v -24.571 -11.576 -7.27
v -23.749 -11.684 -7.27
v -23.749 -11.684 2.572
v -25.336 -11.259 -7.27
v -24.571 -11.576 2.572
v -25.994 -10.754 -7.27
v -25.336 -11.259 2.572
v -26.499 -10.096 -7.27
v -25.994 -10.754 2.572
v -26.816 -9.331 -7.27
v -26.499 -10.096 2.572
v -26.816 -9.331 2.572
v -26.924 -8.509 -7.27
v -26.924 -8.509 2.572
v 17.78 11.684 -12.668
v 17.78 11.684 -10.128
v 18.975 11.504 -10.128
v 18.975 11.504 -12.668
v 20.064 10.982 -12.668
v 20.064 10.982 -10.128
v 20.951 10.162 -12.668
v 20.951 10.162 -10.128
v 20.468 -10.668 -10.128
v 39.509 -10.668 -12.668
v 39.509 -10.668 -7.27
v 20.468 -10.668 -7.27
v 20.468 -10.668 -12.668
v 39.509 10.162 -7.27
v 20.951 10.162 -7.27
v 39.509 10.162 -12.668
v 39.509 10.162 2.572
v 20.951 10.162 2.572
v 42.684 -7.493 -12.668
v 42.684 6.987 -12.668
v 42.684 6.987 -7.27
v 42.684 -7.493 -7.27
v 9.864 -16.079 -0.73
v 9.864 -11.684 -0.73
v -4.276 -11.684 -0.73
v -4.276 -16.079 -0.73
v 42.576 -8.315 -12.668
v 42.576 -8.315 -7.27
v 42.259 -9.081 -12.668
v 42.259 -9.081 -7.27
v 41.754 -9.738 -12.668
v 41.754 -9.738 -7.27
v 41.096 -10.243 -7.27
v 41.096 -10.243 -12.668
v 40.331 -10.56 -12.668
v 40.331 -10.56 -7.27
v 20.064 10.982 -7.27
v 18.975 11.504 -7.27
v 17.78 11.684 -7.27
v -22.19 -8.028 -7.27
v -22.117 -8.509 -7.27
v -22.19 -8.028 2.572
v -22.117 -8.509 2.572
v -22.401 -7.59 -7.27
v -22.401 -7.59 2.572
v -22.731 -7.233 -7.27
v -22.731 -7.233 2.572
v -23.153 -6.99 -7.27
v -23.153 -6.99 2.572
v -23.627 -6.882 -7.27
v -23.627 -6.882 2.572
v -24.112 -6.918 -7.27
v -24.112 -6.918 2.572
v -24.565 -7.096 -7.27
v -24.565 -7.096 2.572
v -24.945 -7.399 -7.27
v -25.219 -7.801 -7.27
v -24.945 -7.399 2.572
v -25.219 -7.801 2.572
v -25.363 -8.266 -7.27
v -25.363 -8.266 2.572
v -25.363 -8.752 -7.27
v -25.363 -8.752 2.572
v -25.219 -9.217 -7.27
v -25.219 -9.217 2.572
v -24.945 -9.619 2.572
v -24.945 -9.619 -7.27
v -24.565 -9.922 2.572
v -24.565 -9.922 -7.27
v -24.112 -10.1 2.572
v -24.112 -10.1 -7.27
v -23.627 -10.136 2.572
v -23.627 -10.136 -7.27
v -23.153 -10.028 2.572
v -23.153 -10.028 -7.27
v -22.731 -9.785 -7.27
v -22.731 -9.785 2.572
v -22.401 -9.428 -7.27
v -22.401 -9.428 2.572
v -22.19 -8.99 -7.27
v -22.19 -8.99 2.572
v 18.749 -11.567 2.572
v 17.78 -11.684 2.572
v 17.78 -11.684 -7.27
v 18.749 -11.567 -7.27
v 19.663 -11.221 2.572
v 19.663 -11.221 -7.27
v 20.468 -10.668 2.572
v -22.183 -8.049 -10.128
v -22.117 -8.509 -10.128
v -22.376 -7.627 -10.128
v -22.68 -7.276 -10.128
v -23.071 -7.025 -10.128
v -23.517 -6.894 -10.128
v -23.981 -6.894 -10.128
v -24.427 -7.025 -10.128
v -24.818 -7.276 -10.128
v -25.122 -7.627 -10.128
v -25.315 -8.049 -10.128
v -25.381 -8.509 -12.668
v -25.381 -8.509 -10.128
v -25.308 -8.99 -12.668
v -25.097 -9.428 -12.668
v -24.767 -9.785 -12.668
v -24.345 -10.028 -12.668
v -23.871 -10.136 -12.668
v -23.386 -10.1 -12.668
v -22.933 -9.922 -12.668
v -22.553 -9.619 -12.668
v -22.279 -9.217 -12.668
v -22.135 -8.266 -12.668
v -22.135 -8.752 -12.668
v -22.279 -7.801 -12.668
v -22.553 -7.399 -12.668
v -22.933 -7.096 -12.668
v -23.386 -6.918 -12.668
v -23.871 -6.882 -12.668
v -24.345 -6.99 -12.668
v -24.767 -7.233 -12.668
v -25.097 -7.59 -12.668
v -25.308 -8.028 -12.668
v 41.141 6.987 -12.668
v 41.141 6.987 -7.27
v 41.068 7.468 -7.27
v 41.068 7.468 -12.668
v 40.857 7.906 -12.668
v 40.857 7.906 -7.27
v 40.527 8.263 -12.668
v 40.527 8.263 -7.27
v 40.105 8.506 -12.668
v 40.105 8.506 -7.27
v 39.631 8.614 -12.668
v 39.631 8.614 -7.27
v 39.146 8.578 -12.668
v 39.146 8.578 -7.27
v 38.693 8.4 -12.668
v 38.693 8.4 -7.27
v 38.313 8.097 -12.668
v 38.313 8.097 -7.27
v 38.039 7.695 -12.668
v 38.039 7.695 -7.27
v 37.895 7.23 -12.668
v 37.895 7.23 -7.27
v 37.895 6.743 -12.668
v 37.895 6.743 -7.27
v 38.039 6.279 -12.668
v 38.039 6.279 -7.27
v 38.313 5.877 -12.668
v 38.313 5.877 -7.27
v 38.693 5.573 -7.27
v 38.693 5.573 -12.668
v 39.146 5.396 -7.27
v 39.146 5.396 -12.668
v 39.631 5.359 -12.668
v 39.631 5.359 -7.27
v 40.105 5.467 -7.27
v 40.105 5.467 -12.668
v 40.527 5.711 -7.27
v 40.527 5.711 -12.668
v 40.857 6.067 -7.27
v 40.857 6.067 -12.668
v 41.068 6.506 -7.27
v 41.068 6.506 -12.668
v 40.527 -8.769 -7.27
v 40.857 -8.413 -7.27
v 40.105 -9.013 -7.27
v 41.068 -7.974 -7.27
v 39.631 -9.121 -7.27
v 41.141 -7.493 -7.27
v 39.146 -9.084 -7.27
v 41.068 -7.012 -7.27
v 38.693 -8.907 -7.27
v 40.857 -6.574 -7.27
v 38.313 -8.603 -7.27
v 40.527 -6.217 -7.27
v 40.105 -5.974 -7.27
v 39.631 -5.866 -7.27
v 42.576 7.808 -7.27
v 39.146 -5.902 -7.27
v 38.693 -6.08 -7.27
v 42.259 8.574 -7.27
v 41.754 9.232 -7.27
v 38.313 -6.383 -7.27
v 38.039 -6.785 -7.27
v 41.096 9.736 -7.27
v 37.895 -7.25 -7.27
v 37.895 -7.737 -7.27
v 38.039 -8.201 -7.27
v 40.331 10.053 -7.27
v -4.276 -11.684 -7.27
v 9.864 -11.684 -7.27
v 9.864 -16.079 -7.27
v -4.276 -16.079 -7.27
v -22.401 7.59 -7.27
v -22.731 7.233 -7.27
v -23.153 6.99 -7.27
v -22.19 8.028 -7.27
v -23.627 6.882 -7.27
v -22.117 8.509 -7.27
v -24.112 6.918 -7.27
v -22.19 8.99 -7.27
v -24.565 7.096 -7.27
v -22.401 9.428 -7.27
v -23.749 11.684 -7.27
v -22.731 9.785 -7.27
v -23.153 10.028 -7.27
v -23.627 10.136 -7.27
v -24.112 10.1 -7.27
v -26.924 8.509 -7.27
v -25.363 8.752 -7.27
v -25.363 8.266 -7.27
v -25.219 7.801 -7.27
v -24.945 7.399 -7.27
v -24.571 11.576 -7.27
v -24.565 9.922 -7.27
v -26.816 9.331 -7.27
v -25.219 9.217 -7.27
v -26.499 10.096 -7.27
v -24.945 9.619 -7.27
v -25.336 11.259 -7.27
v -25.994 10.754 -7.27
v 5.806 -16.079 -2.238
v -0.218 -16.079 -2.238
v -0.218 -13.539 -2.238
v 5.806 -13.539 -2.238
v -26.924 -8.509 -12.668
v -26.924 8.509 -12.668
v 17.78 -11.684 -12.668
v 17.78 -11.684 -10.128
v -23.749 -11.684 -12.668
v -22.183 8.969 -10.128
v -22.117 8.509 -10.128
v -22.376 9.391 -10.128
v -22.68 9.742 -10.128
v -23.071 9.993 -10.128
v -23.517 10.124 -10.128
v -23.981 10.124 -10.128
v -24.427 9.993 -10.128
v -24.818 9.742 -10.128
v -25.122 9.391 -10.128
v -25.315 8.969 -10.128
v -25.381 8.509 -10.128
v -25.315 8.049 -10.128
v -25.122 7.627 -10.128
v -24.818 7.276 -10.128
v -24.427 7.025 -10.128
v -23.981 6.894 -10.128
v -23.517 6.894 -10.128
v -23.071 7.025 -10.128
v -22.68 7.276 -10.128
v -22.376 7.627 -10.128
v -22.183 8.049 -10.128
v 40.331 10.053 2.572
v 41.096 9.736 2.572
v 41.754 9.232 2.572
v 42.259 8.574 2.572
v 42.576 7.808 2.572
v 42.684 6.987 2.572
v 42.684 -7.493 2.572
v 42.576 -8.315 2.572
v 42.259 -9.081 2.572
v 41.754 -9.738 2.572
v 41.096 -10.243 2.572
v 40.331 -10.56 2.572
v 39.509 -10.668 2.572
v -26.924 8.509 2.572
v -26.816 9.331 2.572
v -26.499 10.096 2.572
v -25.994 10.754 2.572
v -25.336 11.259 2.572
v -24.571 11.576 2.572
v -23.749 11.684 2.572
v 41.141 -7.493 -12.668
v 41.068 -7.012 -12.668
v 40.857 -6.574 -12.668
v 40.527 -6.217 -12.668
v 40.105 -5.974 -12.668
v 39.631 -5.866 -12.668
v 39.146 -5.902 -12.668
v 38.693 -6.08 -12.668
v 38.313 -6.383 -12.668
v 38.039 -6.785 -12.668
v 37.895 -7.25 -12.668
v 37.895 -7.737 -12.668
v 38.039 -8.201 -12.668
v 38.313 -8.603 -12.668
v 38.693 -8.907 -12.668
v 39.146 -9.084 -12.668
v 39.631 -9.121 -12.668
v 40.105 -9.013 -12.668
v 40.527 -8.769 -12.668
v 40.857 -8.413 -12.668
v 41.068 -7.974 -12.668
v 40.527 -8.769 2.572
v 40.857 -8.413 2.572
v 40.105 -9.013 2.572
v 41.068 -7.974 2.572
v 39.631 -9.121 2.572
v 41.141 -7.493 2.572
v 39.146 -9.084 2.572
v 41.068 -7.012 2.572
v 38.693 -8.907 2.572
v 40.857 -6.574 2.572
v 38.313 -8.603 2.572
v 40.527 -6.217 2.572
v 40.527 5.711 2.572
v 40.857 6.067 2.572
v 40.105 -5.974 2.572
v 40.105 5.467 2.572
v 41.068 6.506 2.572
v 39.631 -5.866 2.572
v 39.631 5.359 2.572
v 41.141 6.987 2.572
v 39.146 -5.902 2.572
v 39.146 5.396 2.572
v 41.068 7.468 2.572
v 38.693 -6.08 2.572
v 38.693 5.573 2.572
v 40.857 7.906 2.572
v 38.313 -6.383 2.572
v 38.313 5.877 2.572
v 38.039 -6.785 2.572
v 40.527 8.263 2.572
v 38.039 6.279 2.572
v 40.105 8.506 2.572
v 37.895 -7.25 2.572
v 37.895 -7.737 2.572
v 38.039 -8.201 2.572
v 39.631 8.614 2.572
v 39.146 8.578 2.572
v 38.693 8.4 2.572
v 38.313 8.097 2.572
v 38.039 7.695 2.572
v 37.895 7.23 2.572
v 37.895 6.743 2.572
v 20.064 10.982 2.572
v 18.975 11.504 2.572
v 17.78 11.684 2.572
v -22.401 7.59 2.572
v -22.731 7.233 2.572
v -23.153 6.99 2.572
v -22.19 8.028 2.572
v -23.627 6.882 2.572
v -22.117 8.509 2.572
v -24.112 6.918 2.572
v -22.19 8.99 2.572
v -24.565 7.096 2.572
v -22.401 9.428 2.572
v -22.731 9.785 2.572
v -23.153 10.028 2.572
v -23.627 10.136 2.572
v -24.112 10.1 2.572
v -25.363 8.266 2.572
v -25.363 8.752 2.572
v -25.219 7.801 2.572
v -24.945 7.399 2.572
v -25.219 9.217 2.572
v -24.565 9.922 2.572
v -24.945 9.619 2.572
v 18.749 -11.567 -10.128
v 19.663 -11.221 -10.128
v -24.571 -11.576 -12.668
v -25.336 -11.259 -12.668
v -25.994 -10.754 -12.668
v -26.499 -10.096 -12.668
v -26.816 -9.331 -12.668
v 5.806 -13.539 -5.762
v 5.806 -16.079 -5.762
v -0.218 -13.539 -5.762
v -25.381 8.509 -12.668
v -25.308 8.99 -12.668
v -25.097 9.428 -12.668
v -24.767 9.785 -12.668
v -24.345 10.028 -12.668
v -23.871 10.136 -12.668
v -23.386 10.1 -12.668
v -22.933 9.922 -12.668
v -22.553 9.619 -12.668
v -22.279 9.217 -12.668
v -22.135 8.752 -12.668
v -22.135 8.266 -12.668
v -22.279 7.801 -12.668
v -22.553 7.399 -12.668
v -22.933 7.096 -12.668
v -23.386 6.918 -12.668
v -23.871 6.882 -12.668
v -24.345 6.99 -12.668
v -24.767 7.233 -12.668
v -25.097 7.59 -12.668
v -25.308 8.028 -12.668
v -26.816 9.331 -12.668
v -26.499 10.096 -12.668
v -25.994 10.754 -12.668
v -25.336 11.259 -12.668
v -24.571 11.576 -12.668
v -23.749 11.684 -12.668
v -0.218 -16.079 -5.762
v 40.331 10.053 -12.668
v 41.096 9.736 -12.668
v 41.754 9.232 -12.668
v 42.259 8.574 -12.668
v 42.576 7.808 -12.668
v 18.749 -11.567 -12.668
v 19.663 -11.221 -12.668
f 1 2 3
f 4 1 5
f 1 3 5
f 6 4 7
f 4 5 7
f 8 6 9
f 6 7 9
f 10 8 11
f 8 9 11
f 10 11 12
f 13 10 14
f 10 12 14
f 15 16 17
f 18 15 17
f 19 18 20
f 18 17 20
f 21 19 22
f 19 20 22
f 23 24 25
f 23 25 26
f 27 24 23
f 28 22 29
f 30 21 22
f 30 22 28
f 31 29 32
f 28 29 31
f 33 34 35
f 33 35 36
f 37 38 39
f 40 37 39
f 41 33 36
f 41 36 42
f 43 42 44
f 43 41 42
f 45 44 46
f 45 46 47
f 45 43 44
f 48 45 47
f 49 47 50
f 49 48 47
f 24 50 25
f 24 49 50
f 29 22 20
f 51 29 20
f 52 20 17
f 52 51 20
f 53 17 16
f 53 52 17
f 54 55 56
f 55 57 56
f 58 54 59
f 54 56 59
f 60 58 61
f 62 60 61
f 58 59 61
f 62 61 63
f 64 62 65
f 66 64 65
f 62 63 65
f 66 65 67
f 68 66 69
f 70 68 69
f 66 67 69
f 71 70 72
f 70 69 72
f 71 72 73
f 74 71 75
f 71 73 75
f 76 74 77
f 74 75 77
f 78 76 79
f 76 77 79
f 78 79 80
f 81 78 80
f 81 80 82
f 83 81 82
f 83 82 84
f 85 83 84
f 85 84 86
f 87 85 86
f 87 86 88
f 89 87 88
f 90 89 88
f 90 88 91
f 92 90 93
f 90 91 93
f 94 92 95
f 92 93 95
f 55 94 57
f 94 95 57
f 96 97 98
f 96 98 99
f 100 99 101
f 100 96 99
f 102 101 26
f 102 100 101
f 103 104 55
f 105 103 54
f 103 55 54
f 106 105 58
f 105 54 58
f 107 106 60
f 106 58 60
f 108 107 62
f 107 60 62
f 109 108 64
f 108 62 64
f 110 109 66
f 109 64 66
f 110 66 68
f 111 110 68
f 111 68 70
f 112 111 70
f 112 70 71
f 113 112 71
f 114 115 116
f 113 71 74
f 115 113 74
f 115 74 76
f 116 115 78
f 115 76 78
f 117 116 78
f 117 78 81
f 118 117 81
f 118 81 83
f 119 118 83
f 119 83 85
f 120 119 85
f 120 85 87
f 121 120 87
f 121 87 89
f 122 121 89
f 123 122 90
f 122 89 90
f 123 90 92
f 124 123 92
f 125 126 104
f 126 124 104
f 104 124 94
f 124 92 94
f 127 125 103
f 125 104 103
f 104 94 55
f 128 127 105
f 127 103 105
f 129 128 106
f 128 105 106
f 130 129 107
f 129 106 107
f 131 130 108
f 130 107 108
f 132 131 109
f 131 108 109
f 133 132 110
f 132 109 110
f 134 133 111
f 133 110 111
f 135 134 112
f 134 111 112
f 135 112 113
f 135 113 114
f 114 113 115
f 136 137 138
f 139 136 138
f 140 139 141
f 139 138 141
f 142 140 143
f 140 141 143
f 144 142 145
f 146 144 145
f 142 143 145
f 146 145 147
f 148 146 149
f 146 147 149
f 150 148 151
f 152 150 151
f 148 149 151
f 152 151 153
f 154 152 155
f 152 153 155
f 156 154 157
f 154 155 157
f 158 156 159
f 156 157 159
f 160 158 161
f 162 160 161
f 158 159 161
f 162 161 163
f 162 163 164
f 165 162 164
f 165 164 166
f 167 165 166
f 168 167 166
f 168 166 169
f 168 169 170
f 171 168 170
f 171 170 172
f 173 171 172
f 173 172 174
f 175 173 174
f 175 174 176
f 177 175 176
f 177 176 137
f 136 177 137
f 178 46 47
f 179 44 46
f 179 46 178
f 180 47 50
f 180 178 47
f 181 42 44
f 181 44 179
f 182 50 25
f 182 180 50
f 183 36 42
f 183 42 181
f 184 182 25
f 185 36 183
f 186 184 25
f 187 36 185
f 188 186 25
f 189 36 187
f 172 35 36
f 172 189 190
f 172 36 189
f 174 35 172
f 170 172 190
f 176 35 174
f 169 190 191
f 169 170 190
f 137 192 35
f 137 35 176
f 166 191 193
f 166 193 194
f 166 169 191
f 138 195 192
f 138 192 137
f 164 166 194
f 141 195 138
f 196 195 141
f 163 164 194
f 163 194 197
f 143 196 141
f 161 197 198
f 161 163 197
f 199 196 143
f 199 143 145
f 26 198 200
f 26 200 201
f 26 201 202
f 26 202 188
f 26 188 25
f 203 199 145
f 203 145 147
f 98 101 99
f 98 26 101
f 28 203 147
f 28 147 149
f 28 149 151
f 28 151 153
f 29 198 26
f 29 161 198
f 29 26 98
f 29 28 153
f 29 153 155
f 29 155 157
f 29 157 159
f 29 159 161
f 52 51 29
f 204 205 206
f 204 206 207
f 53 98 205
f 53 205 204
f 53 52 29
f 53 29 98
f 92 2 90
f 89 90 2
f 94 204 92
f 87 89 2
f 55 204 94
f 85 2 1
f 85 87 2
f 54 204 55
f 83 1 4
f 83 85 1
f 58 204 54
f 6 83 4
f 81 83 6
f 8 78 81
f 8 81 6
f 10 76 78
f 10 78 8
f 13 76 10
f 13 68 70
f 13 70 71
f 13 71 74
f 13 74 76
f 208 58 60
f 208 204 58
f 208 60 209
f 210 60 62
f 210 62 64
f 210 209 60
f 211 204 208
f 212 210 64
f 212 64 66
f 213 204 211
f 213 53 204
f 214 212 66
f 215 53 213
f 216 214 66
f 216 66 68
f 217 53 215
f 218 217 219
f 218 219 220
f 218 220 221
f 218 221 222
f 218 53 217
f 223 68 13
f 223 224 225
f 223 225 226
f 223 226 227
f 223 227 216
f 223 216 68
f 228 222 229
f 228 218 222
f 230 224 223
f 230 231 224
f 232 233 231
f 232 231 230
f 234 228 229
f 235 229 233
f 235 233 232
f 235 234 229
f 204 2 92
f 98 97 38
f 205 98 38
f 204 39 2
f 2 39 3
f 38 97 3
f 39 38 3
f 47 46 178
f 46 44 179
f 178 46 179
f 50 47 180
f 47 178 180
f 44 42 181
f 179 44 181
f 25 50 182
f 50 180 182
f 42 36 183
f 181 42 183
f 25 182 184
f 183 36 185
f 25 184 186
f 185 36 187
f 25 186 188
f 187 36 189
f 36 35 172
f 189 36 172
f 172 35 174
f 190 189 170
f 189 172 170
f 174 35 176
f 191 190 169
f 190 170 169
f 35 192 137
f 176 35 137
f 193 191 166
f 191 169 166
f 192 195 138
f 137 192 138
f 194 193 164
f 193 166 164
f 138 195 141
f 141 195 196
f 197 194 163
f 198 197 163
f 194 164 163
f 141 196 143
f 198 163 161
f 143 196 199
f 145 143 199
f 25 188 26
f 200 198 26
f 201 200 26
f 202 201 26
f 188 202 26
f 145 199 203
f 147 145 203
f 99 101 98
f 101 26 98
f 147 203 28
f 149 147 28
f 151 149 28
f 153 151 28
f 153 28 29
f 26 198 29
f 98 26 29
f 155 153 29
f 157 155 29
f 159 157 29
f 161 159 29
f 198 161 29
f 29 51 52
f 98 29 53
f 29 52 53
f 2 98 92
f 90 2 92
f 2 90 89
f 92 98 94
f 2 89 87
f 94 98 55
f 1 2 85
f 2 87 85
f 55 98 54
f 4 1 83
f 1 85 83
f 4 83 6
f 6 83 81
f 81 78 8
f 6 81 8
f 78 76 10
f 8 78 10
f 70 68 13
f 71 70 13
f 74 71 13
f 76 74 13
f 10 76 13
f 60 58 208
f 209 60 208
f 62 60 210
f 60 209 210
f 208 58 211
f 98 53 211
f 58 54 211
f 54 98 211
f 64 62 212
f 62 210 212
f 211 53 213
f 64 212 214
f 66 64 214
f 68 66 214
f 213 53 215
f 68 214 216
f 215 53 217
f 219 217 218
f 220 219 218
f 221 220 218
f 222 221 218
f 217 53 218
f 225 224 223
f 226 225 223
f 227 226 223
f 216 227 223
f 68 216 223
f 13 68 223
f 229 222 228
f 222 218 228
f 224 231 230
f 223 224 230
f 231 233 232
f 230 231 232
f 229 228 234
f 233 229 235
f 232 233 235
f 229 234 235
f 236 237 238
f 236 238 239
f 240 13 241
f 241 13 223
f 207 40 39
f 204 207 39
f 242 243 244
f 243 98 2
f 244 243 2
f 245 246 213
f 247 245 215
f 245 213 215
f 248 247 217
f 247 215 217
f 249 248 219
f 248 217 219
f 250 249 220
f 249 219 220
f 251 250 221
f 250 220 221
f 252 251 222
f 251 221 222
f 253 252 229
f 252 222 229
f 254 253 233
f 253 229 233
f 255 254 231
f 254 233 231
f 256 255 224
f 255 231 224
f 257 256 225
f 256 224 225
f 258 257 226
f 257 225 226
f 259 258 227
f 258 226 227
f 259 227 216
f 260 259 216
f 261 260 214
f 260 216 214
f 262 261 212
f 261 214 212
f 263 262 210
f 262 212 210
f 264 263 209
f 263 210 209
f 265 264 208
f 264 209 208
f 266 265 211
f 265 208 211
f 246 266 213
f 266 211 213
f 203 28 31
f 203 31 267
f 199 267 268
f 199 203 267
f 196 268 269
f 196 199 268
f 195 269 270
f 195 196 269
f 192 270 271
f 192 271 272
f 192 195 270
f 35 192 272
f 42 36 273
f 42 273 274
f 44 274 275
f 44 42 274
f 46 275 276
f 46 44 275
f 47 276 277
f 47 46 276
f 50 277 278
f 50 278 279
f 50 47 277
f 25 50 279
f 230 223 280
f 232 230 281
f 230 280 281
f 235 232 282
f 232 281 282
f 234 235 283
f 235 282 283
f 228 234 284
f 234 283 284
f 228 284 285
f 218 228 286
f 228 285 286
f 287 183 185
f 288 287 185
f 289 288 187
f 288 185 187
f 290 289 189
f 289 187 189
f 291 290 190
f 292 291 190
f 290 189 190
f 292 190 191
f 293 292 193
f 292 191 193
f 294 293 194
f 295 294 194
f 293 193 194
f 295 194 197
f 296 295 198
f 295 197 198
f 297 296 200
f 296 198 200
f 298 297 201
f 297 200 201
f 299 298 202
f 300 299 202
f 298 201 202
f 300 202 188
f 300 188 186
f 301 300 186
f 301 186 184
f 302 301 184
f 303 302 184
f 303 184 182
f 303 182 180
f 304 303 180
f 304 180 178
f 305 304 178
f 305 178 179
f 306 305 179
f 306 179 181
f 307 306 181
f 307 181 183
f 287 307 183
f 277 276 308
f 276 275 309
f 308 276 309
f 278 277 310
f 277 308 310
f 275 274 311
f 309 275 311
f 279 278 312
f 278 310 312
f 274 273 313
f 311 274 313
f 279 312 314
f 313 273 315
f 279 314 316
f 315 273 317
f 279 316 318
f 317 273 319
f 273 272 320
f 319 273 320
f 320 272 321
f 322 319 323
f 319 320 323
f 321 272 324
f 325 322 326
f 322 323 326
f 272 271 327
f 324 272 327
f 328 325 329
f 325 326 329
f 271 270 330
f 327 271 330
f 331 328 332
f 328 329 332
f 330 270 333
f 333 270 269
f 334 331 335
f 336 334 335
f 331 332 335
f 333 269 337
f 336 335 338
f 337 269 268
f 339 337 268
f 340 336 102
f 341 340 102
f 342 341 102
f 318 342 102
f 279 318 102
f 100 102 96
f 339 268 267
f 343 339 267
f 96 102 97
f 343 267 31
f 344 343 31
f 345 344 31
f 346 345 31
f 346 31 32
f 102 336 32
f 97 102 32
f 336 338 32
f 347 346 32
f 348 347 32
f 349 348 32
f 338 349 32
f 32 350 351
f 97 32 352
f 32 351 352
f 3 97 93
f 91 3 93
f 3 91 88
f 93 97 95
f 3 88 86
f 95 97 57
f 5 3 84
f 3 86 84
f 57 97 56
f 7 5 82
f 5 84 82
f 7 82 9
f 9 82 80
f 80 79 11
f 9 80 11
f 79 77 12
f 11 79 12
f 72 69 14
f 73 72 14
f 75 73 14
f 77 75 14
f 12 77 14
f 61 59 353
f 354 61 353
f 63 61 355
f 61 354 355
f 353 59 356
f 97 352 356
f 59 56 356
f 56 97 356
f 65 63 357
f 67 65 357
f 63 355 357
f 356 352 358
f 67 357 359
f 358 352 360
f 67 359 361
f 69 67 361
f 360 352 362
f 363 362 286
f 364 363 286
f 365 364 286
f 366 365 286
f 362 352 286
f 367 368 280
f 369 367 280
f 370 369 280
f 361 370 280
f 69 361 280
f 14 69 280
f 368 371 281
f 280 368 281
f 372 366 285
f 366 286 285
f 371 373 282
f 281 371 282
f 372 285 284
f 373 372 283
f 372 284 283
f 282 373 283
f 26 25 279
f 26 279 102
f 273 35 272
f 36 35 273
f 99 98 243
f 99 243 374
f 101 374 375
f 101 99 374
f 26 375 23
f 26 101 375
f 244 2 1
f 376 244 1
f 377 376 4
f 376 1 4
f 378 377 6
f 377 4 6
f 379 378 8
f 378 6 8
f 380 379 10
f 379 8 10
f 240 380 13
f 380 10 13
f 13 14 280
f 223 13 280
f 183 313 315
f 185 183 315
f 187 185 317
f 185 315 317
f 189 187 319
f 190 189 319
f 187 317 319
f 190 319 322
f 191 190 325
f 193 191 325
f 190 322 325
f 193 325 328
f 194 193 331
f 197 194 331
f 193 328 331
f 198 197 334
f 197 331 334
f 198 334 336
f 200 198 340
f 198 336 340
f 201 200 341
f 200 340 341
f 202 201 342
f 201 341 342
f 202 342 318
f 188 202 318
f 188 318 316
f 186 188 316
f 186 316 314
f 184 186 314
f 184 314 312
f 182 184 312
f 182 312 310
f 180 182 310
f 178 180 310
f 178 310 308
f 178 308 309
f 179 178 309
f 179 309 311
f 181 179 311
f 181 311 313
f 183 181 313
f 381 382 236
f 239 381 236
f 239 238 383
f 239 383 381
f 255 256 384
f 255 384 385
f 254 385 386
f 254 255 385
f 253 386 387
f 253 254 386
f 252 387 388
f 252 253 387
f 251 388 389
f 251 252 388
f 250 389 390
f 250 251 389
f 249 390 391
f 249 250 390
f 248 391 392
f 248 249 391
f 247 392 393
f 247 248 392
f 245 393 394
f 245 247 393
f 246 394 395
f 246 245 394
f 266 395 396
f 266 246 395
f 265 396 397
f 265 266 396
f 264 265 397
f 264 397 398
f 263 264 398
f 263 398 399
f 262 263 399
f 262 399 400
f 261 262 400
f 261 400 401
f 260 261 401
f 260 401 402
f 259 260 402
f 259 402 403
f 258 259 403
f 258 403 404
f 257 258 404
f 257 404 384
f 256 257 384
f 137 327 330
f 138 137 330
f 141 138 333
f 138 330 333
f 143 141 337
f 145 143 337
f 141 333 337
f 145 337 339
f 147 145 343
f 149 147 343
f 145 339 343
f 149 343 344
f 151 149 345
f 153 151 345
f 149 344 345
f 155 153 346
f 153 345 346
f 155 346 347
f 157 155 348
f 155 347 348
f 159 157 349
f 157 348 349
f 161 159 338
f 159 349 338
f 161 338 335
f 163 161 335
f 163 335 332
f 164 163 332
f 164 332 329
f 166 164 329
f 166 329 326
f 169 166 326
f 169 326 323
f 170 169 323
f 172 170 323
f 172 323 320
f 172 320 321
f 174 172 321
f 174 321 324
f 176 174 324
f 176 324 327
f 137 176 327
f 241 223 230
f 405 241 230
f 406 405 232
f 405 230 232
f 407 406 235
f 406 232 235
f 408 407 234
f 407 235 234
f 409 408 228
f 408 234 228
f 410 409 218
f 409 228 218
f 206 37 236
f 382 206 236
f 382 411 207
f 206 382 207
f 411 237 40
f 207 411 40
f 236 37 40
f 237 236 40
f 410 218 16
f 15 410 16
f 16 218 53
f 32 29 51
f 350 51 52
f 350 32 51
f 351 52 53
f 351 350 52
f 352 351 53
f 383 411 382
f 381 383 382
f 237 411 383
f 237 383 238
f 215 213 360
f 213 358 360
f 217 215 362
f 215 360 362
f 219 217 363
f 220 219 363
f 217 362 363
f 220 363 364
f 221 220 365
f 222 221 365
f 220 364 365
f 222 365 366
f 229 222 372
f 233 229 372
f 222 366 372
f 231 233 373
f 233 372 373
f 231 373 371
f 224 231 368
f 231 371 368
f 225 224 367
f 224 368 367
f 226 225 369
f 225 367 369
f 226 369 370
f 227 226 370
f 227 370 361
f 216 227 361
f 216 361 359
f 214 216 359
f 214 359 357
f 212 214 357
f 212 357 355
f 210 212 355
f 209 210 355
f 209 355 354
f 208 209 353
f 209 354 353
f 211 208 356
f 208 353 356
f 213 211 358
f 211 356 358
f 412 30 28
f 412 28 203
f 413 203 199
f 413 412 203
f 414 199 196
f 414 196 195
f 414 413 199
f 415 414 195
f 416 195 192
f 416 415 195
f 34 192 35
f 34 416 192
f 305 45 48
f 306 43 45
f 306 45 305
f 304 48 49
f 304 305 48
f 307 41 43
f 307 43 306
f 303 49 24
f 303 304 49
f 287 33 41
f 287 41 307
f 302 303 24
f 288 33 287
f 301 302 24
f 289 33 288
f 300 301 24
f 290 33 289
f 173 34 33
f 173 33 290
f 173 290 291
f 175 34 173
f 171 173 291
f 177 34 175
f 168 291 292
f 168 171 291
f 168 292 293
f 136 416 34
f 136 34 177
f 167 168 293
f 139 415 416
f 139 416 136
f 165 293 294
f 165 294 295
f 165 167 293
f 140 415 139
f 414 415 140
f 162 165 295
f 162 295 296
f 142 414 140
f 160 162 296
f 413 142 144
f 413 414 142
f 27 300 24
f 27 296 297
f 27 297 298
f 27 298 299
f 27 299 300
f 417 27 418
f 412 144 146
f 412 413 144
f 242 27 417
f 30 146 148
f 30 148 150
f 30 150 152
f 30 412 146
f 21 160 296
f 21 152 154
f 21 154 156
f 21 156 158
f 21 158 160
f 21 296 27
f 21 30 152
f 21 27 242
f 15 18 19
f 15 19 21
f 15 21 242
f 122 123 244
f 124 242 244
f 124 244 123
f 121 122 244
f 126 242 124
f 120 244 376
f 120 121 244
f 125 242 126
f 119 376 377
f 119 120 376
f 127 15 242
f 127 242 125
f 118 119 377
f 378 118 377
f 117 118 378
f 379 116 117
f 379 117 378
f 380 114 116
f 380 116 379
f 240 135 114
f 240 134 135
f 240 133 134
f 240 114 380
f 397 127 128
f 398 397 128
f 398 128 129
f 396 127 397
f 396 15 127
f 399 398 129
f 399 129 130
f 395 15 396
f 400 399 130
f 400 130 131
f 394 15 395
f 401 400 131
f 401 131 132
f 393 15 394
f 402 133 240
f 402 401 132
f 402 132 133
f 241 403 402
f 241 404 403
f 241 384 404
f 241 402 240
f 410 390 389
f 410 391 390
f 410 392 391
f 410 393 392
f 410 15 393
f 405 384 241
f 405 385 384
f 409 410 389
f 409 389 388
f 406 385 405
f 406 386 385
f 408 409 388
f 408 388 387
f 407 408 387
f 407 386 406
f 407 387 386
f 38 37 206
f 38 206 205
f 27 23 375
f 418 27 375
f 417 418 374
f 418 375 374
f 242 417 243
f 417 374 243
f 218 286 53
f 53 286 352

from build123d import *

# Parameters (mm, degrees)
BOSS_EXTRUDE1_START             = 0.508
BOSS_EXTRUDE1_DEPTH             = 12.7
BOSS_EXTRUDE2_DEPTH             = 3.27
BOSS_EXTRUDE2_DEPTH_BACK        = 3.27
SKETCH2_W                       = 14.14
SKETCH2_H                       = 7.9502
SKETCH3_W                       = 36.079999008
SKETCH3_H                       = 20.829999962
BOSS_EXTRUDE3_DEPTH             = 2.54
BOSS_EXTRUDE3_DIRECTION_2_REACH = 31.949
SKETCH7_W                       = 6.024
SKETCH7_H                       = 3.524
CUT_EXTRUDE1_DEPTH              = 2.54
BOSS_EXTRUDE5_DEPTH             = 12.7
F_4_CLEARANCE_HOLE4_D           = 3.2639
BOSS_EXTRUDE6_DEPTH             = 15.24
F_4_CLEARANCE_HOLE5_D           = 3.2639
SKETCH17_R                      = 1.63195
BOSS_EXTRUDE8_DEPTH             = 2.54


with BuildPart() as part:
    # Sketch1 → Boss-Extrude1 (new body)
    with BuildSketch(Plane.XY.offset(2.064).offset(BOSS_EXTRUDE1_START)):
        with BuildLine():
            Line((-21.844, 7.62), (-21.844, -7.62))
            ThreePointArc((-21.844, -7.62), (-20.653681959, -10.493681959), (-17.78, -11.684))
            Line((-17.78, -11.684), (17.78, -11.684))
            ThreePointArc((17.78, -11.684), (20.653681959, -10.493681959), (21.844, -7.62))
            Line((21.844, -7.62), (21.844, 7.62))
            ThreePointArc((21.844, 7.62), (20.653681959, 10.493681959), (17.78, 11.684))
            Line((17.78, 11.684), (-17.78, 11.684))
            ThreePointArc((-17.78, 11.684), (-20.653681959, 10.493681959), (-21.844, 7.62))
        make_face()
    extrude(amount=-BOSS_EXTRUDE1_DEPTH)

    # Sketch2 → Boss-Extrude2 (add, two sides: drawn at the far end of the back side and taken through both)
    with BuildSketch(Plane(origin=(0, 0, -4), x_dir=(-1, 0, 0), z_dir=(0, 0, -1)).offset(-BOSS_EXTRUDE2_DEPTH_BACK)):
        with Locations((-2.794, -12.10347265)):
            Rectangle(SKETCH2_W, SKETCH2_H)
    extrude(amount=BOSS_EXTRUDE2_DEPTH + BOSS_EXTRUDE2_DEPTH_BACK)

    # Sketch3 → Boss-Extrude3 (add)
    with BuildSketch(Plane(origin=(0, 0, -10.128), x_dir=(-1, 0, 0), z_dir=(0, 0, -1))):
        with Locations((-19.563999504, -0.253372669)):
            Rectangle(SKETCH3_W, SKETCH3_H)
    extrude(amount=BOSS_EXTRUDE3_DEPTH)

    # Boss-Extrude3 direction 2: up to this face of the body (flat: up to its plane)
    boss_extrude3_direction_2_end = Plane(part.part.faces().sort_by_distance((0, 0, 2.572))[0])
    # Sketch3 → Boss-Extrude3 direction 2 (add, up to the picked face)
    with BuildSketch(Plane(origin=(0, 0, -10.128), x_dir=(-1, 0, 0), z_dir=(0, 0, -1)), mode=Mode.PRIVATE) as boss_extrude3_direction_2_sk1:
        with Locations((-19.563999504, -0.253372669)):
            Rectangle(SKETCH3_W, SKETCH3_H)
    boss_extrude3_direction_2_tool1 = split(extrude(boss_extrude3_direction_2_sk1.sketch, amount=-BOSS_EXTRUDE3_DIRECTION_2_REACH, mode=Mode.PRIVATE), bisect_by=boss_extrude3_direction_2_end, keep=Keep.BOTH, mode=Mode.PRIVATE)
    add(boss_extrude3_direction_2_tool1.solids().sort_by(Axis((19.564, -0.253373, -10.128), (0, 0, 1)))[0])

    # Sketch7 → Cut-Extrude1 (cut)
    with BuildSketch(Plane.XZ.offset(16.07857265)):
        with Locations((2.794, -4)):
            Rectangle(SKETCH7_W, SKETCH7_H)
    extrude(amount=-CUT_EXTRUDE1_DEPTH, mode=Mode.SUBTRACT)

    # Sketch11 → Boss-Extrude5 (add, through all)
    with BuildSketch(Plane(origin=(0, 0, -10.128), x_dir=(-1, 0, 0), z_dir=(0, 0, -1))):
        with BuildLine():
            Line((17.78, 11.684), (23.749, 11.684))
            ThreePointArc((23.749, 11.684), (25.99406403, 10.75406403), (26.924, 8.509))
            Line((26.924, 8.509), (26.924, -8.509))
            ThreePointArc((26.924, -8.509), (25.99406403, -10.75406403), (23.749, -11.684))
            Line((23.749, -11.684), (17.78, -11.684))
            Line((17.78, -11.684), (-17.78, -11.684))
            ThreePointArc((-17.78, -11.684), (-19.216577452, -11.421623499), (-20.467660727, -10.66837265))
            Line((-20.467660727, -10.66837265), (-1.524, -10.66837265))
            Line((-1.524, -10.66837265), (-1.524, 10.161627312))
            Line((-1.524, 10.161627312), (-20.951155406, 10.161627312))
            ThreePointArc((-20.951155406, 10.161627312), (-19.538823841, 11.283691403), (-17.78, 11.684))
            Line((-17.78, 11.684), (17.78, 11.684))
        make_face()
    extrude(amount=-BOSS_EXTRUDE5_DEPTH)

    # #4 Clearance Hole4 (through all)
    with Locations(Plane(origin=(0, 0, -10.128), x_dir=(-1, 0, 0), z_dir=(0, 0, -1))):
        with Locations((23.749, 8.509), (23.749, -8.509)):
            Hole(F_4_CLEARANCE_HOLE4_D / 2)

    # Sketch14 → Boss-Extrude6 (add, through all)
    with BuildSketch(Plane(origin=(0, 0, -12.668), x_dir=(-1, 0, 0), z_dir=(0, 0, -1))):
        with BuildLine():
            Line((-37.603999008, 10.161627312), (-39.508999008, 10.161627312))
            ThreePointArc((-39.508999008, 10.161627312), (-41.754063038, 9.231691342), (-42.683999008, 6.986627312))
            Line((-42.683999008, 6.986627312), (-42.683999008, -7.49337265))
            ThreePointArc((-42.683999008, -7.49337265), (-41.754063038, -9.73843668), (-39.508999008, -10.66837265))
            Line((-39.508999008, -10.66837265), (-37.603999008, -10.66837265))
            Line((-37.603999008, -10.66837265), (-37.603999008, 10.161627312))
        make_face()
    extrude(amount=-BOSS_EXTRUDE6_DEPTH)

    # #4 Clearance Hole5 (through all)
    with Locations(Plane(origin=(0, 0, -12.668), x_dir=(-1, 0, 0), z_dir=(0, 0, -1))):
        with Locations((-39.508999008, 6.986627312), (-39.508999008, -7.49337265)):
            Hole(F_4_CLEARANCE_HOLE5_D / 2)

    # Sketch17 → Boss-Extrude8 (add)
    with BuildSketch(Plane(origin=(0, 0, -10.128), x_dir=(-1, 0, 0), z_dir=(0, 0, -1))):
        with BuildLine():
            Line((-17.78, -11.684), (23.749, -11.684))
            ThreePointArc((23.749, -11.684), (25.99406403, -10.75406403), (26.924, -8.509))
            Line((26.924, -8.509), (26.924, 8.509))
            ThreePointArc((26.924, 8.509), (25.99406403, 10.75406403), (23.749, 11.684))
            Line((23.749, 11.684), (-17.78, 11.684))
            ThreePointArc((-17.78, 11.684), (-19.538823841, 11.283691403), (-20.951155406, 10.161627312))
            Line((-20.951155406, 10.161627312), (-1.524, 10.161627312))
            Line((-1.524, 10.161627312), (-1.524, -10.66837265))
            Line((-1.524, -10.66837265), (-20.467660727, -10.66837265))
            ThreePointArc((-20.467660727, -10.66837265), (-19.216577452, -11.421623499), (-17.78, -11.684))
        make_face()
        with Locations((23.749, 8.509)):
            Circle(SKETCH17_R, mode=Mode.SUBTRACT)
        with Locations((23.749, -8.509)):
            Circle(SKETCH17_R, mode=Mode.SUBTRACT)
    extrude(amount=BOSS_EXTRUDE8_DEPTH)


with BuildPart() as body_2:
    # Split1: the piece on the far side of the plane
    add(part.part)
    split(bisect_by=Plane(origin=(0, 0, -7.27), x_dir=(-1, 0, 0), z_dir=(0, 0, -1)), keep=Keep.BOTTOM)


with BuildPart() as part_1:
    add(part.part)

    # Split1
    split(bisect_by=Plane(origin=(0, 0, -7.27), x_dir=(-1, 0, 0), z_dir=(0, 0, -1)), keep=Keep.TOP)


solid = Compound([body_2.part, part_1.part])
